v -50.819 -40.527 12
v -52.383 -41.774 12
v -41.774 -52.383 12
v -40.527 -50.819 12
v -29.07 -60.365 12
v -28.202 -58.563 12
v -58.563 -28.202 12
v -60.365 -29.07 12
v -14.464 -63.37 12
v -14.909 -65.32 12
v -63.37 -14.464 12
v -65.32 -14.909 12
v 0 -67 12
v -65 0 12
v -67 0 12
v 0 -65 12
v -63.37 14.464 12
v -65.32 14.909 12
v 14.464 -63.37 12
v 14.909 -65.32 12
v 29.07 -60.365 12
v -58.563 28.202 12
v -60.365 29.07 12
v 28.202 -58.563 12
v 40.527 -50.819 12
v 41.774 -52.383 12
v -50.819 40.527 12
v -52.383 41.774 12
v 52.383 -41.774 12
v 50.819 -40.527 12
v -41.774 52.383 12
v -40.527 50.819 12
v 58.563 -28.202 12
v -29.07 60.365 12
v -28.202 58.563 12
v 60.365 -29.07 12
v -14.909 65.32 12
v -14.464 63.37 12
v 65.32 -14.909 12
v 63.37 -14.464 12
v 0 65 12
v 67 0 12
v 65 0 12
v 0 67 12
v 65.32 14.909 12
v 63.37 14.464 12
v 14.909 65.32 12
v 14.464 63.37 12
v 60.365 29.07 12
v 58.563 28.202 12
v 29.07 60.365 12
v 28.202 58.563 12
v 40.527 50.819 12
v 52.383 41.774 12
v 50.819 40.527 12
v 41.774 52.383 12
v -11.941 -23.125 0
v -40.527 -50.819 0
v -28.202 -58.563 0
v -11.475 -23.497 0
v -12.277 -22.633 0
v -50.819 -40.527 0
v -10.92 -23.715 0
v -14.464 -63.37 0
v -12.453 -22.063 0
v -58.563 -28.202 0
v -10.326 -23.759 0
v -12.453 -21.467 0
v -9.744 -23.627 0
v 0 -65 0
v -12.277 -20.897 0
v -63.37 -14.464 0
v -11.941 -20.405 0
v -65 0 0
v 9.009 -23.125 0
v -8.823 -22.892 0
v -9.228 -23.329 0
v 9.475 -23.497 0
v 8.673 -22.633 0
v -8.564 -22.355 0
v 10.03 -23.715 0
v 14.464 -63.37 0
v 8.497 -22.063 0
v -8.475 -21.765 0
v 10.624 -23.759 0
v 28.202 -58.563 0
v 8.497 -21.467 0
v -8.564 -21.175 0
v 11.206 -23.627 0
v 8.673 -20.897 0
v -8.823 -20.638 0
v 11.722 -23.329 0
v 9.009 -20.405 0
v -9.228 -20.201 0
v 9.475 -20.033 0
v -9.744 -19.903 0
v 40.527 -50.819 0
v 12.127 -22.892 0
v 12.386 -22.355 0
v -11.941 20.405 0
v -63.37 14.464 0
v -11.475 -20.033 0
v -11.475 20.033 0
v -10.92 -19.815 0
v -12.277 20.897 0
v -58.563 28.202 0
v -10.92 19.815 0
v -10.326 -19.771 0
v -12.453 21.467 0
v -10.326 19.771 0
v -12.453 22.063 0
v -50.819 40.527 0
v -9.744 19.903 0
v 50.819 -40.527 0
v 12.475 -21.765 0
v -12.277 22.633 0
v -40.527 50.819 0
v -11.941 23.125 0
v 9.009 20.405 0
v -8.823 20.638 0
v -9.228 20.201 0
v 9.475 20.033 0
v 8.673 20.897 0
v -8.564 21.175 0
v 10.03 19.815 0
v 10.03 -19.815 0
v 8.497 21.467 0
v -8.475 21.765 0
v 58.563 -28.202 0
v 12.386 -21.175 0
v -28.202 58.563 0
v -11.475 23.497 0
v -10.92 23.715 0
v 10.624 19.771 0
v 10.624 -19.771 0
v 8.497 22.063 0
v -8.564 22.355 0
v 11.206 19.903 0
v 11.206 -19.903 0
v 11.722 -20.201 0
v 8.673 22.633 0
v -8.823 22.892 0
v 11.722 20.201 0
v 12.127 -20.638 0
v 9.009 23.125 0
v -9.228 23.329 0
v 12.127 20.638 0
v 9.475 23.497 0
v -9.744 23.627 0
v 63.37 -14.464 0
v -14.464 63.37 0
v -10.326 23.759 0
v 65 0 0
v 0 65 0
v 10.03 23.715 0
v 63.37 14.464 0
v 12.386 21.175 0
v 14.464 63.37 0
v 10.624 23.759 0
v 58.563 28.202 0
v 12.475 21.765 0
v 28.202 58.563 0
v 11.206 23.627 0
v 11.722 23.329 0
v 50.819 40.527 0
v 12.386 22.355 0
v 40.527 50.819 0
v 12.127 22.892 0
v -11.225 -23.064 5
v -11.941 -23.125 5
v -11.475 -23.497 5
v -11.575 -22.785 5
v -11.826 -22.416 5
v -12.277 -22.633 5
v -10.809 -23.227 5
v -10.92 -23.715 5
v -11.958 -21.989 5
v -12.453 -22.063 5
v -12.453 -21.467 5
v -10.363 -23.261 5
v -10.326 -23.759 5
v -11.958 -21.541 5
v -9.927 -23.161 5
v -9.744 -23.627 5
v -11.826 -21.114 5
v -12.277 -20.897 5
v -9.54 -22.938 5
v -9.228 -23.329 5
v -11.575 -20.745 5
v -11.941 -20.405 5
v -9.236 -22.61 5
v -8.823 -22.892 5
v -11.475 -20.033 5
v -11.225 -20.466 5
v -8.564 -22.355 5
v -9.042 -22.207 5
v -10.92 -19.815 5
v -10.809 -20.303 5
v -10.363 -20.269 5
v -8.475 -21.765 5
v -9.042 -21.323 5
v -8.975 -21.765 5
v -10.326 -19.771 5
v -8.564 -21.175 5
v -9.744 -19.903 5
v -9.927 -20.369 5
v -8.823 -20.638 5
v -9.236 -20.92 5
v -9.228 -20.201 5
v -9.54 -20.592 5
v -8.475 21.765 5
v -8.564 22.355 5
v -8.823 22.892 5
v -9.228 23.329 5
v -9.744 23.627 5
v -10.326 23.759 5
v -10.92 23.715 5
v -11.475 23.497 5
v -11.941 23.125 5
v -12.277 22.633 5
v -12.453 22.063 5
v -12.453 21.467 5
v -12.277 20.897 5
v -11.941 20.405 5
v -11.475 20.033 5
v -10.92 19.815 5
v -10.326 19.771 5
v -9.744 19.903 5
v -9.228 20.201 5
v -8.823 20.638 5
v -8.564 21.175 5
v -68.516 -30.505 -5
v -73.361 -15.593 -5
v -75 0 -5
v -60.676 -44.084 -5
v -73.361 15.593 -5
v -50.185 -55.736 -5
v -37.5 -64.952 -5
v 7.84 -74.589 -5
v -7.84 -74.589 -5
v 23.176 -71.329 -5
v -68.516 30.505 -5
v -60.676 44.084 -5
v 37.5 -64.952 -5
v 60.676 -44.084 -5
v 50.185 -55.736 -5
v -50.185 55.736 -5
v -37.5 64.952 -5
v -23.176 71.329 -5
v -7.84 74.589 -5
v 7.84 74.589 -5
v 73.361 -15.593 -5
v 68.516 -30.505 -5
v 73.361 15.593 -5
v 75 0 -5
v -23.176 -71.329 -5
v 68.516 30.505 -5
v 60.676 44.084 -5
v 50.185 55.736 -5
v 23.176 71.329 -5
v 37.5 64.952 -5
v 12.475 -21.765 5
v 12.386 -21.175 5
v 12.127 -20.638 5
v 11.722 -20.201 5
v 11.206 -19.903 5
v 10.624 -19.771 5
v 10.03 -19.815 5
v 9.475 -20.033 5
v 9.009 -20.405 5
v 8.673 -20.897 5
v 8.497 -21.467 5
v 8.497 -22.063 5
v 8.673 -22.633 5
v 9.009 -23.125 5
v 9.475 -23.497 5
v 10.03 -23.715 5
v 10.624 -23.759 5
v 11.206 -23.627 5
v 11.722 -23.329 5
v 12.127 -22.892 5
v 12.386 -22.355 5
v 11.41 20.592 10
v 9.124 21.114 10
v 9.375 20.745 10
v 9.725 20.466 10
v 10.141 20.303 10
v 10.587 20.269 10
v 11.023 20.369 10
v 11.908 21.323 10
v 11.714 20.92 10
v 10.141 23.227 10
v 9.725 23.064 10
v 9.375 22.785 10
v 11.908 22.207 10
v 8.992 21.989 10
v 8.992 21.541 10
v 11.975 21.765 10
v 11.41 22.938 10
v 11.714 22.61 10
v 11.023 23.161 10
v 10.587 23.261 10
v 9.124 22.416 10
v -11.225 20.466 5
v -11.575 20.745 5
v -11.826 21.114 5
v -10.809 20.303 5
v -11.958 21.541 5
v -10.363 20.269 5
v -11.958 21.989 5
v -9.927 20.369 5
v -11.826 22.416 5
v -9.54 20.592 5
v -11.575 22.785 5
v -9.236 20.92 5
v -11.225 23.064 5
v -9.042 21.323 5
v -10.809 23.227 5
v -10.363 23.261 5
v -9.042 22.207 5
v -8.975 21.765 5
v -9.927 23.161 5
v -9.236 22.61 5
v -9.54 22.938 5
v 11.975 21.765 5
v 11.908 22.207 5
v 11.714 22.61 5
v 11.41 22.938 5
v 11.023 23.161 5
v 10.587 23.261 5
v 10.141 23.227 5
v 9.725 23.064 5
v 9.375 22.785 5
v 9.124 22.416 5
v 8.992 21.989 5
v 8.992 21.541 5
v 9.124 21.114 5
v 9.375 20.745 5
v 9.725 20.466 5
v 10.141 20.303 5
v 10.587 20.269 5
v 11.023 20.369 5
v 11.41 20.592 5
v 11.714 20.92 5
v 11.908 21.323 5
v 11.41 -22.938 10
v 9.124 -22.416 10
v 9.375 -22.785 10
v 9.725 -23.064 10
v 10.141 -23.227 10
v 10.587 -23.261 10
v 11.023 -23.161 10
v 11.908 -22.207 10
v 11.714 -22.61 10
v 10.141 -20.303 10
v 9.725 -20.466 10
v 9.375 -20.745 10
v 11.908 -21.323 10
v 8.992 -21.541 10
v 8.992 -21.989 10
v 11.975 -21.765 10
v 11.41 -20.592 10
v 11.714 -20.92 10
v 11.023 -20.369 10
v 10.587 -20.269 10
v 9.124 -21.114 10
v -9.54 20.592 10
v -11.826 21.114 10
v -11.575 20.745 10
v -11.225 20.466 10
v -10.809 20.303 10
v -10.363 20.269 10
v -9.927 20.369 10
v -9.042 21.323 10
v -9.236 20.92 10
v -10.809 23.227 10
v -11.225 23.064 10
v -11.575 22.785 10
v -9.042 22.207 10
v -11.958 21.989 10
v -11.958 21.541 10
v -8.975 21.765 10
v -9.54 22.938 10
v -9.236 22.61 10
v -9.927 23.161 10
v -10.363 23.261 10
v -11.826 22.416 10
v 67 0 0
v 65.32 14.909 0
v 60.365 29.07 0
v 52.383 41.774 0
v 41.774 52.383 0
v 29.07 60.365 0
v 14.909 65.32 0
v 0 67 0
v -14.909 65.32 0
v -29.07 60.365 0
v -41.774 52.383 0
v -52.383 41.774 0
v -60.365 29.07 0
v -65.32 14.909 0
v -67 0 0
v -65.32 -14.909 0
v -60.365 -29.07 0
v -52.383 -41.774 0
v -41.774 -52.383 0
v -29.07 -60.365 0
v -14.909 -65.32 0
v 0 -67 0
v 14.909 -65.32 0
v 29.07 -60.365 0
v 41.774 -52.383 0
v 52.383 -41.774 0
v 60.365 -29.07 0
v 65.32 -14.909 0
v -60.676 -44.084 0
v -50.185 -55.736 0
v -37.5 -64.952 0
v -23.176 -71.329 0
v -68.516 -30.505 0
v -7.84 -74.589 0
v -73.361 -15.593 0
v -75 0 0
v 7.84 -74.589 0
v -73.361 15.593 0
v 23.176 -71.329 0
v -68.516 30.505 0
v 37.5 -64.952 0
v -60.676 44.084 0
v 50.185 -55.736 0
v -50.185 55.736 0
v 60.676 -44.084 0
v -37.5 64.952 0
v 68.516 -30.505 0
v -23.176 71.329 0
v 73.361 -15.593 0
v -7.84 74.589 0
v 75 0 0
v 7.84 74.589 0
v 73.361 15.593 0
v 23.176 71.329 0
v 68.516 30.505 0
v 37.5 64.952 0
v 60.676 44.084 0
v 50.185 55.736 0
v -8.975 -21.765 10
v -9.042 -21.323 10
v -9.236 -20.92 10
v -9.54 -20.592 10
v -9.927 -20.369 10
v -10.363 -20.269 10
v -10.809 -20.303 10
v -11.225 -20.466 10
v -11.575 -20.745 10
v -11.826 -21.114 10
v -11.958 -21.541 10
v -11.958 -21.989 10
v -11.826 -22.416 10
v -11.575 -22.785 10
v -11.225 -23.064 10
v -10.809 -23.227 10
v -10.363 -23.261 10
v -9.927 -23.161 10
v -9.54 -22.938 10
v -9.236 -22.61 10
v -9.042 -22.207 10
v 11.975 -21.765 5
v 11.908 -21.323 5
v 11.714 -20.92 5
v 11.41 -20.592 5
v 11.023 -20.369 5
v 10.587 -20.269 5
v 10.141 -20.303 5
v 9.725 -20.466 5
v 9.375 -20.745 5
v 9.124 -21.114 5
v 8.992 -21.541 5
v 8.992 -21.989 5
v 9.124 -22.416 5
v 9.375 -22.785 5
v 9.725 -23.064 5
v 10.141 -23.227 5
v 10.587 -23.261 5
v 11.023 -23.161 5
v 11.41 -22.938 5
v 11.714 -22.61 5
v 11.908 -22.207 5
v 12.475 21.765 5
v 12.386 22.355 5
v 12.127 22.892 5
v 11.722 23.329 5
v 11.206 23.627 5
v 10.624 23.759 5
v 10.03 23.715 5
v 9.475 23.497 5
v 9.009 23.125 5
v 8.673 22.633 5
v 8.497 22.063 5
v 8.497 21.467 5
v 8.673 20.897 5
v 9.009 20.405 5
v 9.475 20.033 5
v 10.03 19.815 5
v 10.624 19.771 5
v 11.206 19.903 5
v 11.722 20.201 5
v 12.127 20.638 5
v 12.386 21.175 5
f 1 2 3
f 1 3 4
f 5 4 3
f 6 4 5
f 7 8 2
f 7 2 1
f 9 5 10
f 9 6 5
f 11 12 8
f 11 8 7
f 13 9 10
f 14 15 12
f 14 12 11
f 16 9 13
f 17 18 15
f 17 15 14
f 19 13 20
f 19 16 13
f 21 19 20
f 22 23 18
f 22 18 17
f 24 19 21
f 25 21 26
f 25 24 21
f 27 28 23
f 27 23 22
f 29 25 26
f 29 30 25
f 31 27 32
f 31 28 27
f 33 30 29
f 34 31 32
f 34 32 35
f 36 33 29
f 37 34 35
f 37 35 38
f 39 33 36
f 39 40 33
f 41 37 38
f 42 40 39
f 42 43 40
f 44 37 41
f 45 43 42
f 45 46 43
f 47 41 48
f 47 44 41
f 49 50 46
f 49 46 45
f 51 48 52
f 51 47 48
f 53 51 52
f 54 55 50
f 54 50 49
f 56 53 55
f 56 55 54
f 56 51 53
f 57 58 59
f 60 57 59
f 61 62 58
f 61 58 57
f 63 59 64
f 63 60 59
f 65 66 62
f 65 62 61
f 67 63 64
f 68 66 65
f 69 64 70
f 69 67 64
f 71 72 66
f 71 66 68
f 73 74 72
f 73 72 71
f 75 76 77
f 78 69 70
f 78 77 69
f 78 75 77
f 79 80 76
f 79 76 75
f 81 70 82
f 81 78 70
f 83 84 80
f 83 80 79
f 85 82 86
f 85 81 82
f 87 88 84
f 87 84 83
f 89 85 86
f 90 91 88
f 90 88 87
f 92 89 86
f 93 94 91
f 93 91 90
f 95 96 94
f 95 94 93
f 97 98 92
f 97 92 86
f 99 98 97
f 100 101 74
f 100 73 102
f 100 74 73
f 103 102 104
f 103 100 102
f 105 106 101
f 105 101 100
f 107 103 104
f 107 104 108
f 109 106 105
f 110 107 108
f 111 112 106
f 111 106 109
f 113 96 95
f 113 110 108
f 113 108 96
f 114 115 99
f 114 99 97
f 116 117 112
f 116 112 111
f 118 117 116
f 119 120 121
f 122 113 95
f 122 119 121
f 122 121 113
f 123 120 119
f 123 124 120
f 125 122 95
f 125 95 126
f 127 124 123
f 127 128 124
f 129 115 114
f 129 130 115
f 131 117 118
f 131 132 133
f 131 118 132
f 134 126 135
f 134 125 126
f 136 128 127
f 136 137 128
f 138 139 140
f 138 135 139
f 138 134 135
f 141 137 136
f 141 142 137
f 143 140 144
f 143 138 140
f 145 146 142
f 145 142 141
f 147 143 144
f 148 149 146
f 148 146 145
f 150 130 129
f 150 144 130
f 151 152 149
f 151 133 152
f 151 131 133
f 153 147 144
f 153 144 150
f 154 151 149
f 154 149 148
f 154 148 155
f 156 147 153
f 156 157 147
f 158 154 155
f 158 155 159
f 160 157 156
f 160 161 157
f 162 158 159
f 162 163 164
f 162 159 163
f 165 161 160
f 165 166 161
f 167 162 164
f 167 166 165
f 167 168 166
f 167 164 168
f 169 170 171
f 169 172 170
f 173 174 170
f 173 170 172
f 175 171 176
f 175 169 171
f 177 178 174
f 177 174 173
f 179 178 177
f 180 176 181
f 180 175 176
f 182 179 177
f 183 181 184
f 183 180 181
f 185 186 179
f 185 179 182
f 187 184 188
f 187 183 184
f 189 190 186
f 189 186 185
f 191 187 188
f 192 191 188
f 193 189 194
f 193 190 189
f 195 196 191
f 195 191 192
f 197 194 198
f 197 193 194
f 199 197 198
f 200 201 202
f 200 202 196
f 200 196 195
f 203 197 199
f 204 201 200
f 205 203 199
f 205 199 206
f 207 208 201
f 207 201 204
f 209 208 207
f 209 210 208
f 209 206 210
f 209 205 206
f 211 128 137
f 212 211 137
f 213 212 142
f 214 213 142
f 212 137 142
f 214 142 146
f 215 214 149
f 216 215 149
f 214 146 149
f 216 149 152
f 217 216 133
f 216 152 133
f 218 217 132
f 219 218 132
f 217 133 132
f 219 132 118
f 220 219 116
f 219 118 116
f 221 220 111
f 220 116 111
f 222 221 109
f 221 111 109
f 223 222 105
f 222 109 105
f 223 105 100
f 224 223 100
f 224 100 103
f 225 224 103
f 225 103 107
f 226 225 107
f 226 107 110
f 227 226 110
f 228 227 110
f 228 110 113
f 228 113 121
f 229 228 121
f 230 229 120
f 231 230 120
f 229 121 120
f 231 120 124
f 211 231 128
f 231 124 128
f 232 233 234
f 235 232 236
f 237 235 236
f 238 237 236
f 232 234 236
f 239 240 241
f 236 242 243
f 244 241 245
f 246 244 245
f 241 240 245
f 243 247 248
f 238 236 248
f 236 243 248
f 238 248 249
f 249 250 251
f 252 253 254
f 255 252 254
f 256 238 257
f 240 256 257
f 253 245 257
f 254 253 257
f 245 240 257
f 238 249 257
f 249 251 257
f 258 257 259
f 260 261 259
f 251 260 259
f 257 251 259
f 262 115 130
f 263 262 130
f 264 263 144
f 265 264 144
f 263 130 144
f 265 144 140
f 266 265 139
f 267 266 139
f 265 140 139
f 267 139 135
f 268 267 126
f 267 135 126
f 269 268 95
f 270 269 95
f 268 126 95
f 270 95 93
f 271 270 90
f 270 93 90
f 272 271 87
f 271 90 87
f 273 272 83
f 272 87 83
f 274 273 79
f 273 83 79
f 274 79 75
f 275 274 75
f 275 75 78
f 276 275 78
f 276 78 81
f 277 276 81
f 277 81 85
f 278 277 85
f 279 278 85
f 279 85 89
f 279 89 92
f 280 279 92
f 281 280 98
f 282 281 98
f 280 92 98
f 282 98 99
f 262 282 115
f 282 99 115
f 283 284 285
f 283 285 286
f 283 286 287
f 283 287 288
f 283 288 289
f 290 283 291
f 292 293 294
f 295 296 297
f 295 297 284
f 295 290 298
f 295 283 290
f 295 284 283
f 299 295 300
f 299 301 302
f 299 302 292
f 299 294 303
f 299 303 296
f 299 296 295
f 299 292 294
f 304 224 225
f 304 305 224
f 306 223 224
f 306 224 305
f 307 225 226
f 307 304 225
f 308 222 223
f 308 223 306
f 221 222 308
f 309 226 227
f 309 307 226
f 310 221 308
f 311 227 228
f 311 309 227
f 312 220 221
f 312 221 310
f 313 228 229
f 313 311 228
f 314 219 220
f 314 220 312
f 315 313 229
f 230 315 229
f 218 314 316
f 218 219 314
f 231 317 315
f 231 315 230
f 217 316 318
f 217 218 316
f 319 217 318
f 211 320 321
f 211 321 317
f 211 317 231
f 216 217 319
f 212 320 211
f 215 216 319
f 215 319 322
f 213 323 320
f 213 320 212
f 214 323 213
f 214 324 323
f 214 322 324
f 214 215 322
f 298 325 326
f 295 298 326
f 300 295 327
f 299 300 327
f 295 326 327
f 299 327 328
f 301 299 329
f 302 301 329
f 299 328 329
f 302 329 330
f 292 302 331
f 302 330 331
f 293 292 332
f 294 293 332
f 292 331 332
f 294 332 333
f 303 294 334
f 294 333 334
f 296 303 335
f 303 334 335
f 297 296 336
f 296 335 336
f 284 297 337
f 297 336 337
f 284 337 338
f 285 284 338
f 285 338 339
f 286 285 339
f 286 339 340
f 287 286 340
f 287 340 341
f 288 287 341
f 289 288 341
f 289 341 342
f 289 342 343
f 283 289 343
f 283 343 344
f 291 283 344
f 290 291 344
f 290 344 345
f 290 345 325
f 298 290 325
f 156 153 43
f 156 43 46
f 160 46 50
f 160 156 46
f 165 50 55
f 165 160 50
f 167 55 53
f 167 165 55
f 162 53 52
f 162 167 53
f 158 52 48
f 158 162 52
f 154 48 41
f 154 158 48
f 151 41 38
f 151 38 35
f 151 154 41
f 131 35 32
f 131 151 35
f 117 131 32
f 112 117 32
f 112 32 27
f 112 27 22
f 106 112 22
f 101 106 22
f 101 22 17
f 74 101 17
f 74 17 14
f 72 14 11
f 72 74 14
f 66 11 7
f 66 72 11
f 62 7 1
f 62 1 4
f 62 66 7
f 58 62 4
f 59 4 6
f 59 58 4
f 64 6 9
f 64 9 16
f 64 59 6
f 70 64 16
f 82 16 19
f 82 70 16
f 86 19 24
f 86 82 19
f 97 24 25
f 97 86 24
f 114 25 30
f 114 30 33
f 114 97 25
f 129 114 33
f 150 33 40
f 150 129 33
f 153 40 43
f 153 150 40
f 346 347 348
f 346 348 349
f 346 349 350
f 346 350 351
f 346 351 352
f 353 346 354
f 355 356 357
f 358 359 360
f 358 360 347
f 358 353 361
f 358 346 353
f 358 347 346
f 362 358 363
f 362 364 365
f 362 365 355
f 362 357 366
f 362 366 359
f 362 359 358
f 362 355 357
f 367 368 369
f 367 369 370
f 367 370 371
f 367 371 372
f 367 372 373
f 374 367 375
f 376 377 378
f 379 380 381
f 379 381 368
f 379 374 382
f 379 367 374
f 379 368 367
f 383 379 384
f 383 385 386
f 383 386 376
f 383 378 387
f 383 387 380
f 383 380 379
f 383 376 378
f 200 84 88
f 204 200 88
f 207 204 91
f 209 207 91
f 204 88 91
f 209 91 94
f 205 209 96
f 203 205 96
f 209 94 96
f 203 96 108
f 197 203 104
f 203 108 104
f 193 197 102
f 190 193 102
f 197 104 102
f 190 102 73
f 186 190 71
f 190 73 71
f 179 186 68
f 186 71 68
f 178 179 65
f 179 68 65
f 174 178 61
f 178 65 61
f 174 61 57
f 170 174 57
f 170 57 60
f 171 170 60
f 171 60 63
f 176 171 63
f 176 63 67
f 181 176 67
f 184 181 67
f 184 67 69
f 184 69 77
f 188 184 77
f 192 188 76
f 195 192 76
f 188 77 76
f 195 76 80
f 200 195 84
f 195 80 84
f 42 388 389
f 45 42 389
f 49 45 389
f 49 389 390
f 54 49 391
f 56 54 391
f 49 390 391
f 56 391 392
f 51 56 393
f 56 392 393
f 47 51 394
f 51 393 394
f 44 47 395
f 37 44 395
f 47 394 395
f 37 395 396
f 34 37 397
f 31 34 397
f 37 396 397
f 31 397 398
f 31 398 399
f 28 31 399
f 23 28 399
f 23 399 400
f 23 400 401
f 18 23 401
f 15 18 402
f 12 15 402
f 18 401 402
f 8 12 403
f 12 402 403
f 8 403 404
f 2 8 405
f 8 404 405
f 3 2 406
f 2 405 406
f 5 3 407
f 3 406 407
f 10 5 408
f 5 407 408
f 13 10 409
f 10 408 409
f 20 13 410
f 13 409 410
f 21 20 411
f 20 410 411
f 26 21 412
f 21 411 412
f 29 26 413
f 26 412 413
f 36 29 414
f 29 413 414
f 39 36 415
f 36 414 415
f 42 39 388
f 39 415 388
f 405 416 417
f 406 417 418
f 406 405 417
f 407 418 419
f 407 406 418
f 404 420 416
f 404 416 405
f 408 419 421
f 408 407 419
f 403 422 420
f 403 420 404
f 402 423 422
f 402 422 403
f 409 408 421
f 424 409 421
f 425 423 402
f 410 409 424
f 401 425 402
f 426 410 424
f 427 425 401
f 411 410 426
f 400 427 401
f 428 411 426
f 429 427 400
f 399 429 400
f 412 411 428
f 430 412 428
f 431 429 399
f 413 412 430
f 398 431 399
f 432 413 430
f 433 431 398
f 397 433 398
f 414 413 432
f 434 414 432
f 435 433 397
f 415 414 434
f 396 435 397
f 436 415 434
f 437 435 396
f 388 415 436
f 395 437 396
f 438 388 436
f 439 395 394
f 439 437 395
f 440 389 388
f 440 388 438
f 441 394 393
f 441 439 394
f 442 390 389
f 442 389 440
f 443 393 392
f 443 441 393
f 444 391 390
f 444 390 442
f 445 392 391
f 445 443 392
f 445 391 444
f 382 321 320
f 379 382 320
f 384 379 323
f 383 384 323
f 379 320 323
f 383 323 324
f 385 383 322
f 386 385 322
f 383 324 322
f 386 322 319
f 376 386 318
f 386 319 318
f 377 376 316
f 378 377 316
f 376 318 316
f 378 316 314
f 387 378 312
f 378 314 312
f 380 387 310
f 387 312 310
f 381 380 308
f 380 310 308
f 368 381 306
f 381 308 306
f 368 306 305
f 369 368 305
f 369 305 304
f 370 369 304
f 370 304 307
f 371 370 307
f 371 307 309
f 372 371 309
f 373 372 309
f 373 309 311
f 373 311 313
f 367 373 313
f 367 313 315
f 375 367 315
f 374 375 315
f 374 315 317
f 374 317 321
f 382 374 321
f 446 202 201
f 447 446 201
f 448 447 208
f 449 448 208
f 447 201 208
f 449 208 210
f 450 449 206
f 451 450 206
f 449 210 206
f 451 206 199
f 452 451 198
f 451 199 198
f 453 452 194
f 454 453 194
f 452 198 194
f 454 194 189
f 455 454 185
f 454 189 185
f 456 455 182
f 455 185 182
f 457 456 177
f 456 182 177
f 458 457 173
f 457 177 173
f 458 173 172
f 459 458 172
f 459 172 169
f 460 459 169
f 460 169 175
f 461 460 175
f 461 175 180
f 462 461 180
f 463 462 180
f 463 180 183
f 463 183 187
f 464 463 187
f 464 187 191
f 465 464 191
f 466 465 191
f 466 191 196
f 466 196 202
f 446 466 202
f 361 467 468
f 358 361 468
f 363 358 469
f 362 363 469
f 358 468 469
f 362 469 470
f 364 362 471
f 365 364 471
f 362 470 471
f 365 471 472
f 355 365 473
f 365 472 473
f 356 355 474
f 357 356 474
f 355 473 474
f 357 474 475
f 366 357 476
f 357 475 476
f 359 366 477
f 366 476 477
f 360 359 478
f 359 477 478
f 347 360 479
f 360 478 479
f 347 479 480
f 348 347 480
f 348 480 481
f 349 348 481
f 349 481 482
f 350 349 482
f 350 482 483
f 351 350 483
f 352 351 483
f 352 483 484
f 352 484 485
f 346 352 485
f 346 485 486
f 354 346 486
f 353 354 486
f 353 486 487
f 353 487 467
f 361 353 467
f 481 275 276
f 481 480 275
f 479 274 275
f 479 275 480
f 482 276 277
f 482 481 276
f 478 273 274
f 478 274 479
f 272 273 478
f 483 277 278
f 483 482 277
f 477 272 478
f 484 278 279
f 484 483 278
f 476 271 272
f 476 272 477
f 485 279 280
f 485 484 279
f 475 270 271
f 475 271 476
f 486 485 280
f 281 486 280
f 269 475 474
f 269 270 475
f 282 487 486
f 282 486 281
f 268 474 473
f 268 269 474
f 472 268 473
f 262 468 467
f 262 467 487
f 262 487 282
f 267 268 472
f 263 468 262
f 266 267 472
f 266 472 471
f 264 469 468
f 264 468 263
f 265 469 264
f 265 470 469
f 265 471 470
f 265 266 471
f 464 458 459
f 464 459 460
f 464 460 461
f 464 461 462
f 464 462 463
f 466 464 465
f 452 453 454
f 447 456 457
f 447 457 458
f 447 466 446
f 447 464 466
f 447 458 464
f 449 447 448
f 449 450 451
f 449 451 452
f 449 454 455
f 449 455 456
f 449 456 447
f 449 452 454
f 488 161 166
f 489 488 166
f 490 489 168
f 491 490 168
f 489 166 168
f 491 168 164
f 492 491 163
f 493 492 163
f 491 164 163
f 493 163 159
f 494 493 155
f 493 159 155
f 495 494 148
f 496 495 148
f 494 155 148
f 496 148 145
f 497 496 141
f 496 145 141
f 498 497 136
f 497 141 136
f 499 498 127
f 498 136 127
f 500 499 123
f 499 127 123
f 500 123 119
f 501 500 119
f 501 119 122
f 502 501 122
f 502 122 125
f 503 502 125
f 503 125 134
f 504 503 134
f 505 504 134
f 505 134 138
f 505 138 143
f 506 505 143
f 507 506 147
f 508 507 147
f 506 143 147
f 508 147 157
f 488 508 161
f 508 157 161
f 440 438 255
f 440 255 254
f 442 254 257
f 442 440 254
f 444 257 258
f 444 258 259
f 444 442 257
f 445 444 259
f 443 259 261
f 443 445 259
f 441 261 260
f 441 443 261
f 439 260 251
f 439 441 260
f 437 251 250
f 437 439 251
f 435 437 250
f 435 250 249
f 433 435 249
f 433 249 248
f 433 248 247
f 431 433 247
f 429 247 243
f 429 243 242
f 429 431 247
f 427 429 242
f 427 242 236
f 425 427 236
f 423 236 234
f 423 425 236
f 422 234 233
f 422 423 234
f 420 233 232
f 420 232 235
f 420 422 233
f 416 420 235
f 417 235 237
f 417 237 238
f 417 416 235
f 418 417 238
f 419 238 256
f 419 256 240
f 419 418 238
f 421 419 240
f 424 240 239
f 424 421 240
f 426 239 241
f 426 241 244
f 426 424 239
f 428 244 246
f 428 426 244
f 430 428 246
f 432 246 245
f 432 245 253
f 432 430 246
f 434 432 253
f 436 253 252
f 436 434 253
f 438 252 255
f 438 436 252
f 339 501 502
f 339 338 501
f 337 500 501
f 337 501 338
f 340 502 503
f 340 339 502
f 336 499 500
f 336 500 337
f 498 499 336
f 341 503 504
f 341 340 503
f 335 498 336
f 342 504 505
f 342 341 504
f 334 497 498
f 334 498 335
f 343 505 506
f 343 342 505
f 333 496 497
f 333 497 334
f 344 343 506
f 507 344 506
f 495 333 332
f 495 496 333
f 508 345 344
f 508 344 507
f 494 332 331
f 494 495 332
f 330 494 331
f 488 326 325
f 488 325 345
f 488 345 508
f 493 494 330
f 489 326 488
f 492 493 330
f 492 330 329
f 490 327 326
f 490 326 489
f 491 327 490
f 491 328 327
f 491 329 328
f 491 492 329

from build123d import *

# Parameters (mm, degrees)
F1_R     = 75
F1_R_2   = 67
F1_R_3   = 65
F1_W     = 25.57
F1_H     = 48.15
F1_R_4   = 2
F1_R_5   = 1.5
F2_DEPTH = 5
F3_DEPTH = 10
F4_DEPTH = 5
F5_DEPTH = 12


with BuildPart() as f2:
    # F1 (on Top) → F2 (new body)
    with BuildSketch(Plane.XY):
        Circle(F1_R)
        Circle(F1_R_2, mode=Mode.SUBTRACT)
        Circle(F1_R_2)
        Circle(F1_R_3, mode=Mode.SUBTRACT)
        Circle(F1_R_3)
        Rectangle(F1_W, F1_H, mode=Mode.SUBTRACT)
        Rectangle(F1_W, F1_H)
        with Locations((-10.475, -21.765)):
            Circle(F1_R_4, mode=Mode.SUBTRACT)
        with Locations((10.475, -21.765)):
            Circle(F1_R_4, mode=Mode.SUBTRACT)
        with Locations((-10.475, 21.765)):
            Circle(F1_R_4, mode=Mode.SUBTRACT)
        with Locations((10.475, 21.765)):
            Circle(F1_R_4, mode=Mode.SUBTRACT)
        with Locations((-10.475, 21.765)):
            Circle(F1_R_4)
        with Locations((-10.475, 21.765)):
            Circle(F1_R_5, mode=Mode.SUBTRACT)
        with Locations((-10.475, -21.765)):
            Circle(F1_R_4)
        with Locations((-10.475, -21.765)):
            Circle(F1_R_5, mode=Mode.SUBTRACT)
        with Locations((10.475, -21.765)):
            Circle(F1_R_4)
        with Locations((10.475, -21.765)):
            Circle(F1_R_5, mode=Mode.SUBTRACT)
        with Locations((10.475, 21.765)):
            Circle(F1_R_4)
        with Locations((10.475, 21.765)):
            Circle(F1_R_5, mode=Mode.SUBTRACT)
        with Locations((10.475, -21.765)):
            Circle(F1_R_5)
        with Locations((-10.475, 21.765)):
            Circle(F1_R_5)
        with Locations((10.475, 21.765)):
            Circle(F1_R_5)
        with Locations((-10.475, -21.765)):
            Circle(F1_R_5)
    extrude(amount=-F2_DEPTH)

    # F1 (on Top) → F3 (join)
    with BuildSketch(Plane.XY):
        with Locations((10.475, 21.765)):
            Circle(F1_R_5)
        with Locations((-10.475, 21.765)):
            Circle(F1_R_5)
        with Locations((10.475, -21.765)):
            Circle(F1_R_5)
        with Locations((-10.475, -21.765)):
            Circle(F1_R_5)
    extrude(amount=F3_DEPTH)

    # F1 (on Top) → F4 (join)
    with BuildSketch(Plane.XY):
        with Locations((10.475, 21.765)):
            Circle(F1_R_4)
        with Locations((10.475, 21.765)):
            Circle(F1_R_5, mode=Mode.SUBTRACT)
        with Locations((-10.475, 21.765)):
            Circle(F1_R_4)
        with Locations((-10.475, 21.765)):
            Circle(F1_R_5, mode=Mode.SUBTRACT)
        with Locations((-10.475, -21.765)):
            Circle(F1_R_4)
        with Locations((-10.475, -21.765)):
            Circle(F1_R_5, mode=Mode.SUBTRACT)
        with Locations((10.475, -21.765)):
            Circle(F1_R_4)
        with Locations((10.475, -21.765)):
            Circle(F1_R_5, mode=Mode.SUBTRACT)
    extrude(amount=F4_DEPTH)

    # F1 (on Top) → F5 (join)
    with BuildSketch(Plane.XY):
        Circle(F1_R_2)
        Circle(F1_R_3, mode=Mode.SUBTRACT)
    extrude(amount=F5_DEPTH)


solid = f2.part
